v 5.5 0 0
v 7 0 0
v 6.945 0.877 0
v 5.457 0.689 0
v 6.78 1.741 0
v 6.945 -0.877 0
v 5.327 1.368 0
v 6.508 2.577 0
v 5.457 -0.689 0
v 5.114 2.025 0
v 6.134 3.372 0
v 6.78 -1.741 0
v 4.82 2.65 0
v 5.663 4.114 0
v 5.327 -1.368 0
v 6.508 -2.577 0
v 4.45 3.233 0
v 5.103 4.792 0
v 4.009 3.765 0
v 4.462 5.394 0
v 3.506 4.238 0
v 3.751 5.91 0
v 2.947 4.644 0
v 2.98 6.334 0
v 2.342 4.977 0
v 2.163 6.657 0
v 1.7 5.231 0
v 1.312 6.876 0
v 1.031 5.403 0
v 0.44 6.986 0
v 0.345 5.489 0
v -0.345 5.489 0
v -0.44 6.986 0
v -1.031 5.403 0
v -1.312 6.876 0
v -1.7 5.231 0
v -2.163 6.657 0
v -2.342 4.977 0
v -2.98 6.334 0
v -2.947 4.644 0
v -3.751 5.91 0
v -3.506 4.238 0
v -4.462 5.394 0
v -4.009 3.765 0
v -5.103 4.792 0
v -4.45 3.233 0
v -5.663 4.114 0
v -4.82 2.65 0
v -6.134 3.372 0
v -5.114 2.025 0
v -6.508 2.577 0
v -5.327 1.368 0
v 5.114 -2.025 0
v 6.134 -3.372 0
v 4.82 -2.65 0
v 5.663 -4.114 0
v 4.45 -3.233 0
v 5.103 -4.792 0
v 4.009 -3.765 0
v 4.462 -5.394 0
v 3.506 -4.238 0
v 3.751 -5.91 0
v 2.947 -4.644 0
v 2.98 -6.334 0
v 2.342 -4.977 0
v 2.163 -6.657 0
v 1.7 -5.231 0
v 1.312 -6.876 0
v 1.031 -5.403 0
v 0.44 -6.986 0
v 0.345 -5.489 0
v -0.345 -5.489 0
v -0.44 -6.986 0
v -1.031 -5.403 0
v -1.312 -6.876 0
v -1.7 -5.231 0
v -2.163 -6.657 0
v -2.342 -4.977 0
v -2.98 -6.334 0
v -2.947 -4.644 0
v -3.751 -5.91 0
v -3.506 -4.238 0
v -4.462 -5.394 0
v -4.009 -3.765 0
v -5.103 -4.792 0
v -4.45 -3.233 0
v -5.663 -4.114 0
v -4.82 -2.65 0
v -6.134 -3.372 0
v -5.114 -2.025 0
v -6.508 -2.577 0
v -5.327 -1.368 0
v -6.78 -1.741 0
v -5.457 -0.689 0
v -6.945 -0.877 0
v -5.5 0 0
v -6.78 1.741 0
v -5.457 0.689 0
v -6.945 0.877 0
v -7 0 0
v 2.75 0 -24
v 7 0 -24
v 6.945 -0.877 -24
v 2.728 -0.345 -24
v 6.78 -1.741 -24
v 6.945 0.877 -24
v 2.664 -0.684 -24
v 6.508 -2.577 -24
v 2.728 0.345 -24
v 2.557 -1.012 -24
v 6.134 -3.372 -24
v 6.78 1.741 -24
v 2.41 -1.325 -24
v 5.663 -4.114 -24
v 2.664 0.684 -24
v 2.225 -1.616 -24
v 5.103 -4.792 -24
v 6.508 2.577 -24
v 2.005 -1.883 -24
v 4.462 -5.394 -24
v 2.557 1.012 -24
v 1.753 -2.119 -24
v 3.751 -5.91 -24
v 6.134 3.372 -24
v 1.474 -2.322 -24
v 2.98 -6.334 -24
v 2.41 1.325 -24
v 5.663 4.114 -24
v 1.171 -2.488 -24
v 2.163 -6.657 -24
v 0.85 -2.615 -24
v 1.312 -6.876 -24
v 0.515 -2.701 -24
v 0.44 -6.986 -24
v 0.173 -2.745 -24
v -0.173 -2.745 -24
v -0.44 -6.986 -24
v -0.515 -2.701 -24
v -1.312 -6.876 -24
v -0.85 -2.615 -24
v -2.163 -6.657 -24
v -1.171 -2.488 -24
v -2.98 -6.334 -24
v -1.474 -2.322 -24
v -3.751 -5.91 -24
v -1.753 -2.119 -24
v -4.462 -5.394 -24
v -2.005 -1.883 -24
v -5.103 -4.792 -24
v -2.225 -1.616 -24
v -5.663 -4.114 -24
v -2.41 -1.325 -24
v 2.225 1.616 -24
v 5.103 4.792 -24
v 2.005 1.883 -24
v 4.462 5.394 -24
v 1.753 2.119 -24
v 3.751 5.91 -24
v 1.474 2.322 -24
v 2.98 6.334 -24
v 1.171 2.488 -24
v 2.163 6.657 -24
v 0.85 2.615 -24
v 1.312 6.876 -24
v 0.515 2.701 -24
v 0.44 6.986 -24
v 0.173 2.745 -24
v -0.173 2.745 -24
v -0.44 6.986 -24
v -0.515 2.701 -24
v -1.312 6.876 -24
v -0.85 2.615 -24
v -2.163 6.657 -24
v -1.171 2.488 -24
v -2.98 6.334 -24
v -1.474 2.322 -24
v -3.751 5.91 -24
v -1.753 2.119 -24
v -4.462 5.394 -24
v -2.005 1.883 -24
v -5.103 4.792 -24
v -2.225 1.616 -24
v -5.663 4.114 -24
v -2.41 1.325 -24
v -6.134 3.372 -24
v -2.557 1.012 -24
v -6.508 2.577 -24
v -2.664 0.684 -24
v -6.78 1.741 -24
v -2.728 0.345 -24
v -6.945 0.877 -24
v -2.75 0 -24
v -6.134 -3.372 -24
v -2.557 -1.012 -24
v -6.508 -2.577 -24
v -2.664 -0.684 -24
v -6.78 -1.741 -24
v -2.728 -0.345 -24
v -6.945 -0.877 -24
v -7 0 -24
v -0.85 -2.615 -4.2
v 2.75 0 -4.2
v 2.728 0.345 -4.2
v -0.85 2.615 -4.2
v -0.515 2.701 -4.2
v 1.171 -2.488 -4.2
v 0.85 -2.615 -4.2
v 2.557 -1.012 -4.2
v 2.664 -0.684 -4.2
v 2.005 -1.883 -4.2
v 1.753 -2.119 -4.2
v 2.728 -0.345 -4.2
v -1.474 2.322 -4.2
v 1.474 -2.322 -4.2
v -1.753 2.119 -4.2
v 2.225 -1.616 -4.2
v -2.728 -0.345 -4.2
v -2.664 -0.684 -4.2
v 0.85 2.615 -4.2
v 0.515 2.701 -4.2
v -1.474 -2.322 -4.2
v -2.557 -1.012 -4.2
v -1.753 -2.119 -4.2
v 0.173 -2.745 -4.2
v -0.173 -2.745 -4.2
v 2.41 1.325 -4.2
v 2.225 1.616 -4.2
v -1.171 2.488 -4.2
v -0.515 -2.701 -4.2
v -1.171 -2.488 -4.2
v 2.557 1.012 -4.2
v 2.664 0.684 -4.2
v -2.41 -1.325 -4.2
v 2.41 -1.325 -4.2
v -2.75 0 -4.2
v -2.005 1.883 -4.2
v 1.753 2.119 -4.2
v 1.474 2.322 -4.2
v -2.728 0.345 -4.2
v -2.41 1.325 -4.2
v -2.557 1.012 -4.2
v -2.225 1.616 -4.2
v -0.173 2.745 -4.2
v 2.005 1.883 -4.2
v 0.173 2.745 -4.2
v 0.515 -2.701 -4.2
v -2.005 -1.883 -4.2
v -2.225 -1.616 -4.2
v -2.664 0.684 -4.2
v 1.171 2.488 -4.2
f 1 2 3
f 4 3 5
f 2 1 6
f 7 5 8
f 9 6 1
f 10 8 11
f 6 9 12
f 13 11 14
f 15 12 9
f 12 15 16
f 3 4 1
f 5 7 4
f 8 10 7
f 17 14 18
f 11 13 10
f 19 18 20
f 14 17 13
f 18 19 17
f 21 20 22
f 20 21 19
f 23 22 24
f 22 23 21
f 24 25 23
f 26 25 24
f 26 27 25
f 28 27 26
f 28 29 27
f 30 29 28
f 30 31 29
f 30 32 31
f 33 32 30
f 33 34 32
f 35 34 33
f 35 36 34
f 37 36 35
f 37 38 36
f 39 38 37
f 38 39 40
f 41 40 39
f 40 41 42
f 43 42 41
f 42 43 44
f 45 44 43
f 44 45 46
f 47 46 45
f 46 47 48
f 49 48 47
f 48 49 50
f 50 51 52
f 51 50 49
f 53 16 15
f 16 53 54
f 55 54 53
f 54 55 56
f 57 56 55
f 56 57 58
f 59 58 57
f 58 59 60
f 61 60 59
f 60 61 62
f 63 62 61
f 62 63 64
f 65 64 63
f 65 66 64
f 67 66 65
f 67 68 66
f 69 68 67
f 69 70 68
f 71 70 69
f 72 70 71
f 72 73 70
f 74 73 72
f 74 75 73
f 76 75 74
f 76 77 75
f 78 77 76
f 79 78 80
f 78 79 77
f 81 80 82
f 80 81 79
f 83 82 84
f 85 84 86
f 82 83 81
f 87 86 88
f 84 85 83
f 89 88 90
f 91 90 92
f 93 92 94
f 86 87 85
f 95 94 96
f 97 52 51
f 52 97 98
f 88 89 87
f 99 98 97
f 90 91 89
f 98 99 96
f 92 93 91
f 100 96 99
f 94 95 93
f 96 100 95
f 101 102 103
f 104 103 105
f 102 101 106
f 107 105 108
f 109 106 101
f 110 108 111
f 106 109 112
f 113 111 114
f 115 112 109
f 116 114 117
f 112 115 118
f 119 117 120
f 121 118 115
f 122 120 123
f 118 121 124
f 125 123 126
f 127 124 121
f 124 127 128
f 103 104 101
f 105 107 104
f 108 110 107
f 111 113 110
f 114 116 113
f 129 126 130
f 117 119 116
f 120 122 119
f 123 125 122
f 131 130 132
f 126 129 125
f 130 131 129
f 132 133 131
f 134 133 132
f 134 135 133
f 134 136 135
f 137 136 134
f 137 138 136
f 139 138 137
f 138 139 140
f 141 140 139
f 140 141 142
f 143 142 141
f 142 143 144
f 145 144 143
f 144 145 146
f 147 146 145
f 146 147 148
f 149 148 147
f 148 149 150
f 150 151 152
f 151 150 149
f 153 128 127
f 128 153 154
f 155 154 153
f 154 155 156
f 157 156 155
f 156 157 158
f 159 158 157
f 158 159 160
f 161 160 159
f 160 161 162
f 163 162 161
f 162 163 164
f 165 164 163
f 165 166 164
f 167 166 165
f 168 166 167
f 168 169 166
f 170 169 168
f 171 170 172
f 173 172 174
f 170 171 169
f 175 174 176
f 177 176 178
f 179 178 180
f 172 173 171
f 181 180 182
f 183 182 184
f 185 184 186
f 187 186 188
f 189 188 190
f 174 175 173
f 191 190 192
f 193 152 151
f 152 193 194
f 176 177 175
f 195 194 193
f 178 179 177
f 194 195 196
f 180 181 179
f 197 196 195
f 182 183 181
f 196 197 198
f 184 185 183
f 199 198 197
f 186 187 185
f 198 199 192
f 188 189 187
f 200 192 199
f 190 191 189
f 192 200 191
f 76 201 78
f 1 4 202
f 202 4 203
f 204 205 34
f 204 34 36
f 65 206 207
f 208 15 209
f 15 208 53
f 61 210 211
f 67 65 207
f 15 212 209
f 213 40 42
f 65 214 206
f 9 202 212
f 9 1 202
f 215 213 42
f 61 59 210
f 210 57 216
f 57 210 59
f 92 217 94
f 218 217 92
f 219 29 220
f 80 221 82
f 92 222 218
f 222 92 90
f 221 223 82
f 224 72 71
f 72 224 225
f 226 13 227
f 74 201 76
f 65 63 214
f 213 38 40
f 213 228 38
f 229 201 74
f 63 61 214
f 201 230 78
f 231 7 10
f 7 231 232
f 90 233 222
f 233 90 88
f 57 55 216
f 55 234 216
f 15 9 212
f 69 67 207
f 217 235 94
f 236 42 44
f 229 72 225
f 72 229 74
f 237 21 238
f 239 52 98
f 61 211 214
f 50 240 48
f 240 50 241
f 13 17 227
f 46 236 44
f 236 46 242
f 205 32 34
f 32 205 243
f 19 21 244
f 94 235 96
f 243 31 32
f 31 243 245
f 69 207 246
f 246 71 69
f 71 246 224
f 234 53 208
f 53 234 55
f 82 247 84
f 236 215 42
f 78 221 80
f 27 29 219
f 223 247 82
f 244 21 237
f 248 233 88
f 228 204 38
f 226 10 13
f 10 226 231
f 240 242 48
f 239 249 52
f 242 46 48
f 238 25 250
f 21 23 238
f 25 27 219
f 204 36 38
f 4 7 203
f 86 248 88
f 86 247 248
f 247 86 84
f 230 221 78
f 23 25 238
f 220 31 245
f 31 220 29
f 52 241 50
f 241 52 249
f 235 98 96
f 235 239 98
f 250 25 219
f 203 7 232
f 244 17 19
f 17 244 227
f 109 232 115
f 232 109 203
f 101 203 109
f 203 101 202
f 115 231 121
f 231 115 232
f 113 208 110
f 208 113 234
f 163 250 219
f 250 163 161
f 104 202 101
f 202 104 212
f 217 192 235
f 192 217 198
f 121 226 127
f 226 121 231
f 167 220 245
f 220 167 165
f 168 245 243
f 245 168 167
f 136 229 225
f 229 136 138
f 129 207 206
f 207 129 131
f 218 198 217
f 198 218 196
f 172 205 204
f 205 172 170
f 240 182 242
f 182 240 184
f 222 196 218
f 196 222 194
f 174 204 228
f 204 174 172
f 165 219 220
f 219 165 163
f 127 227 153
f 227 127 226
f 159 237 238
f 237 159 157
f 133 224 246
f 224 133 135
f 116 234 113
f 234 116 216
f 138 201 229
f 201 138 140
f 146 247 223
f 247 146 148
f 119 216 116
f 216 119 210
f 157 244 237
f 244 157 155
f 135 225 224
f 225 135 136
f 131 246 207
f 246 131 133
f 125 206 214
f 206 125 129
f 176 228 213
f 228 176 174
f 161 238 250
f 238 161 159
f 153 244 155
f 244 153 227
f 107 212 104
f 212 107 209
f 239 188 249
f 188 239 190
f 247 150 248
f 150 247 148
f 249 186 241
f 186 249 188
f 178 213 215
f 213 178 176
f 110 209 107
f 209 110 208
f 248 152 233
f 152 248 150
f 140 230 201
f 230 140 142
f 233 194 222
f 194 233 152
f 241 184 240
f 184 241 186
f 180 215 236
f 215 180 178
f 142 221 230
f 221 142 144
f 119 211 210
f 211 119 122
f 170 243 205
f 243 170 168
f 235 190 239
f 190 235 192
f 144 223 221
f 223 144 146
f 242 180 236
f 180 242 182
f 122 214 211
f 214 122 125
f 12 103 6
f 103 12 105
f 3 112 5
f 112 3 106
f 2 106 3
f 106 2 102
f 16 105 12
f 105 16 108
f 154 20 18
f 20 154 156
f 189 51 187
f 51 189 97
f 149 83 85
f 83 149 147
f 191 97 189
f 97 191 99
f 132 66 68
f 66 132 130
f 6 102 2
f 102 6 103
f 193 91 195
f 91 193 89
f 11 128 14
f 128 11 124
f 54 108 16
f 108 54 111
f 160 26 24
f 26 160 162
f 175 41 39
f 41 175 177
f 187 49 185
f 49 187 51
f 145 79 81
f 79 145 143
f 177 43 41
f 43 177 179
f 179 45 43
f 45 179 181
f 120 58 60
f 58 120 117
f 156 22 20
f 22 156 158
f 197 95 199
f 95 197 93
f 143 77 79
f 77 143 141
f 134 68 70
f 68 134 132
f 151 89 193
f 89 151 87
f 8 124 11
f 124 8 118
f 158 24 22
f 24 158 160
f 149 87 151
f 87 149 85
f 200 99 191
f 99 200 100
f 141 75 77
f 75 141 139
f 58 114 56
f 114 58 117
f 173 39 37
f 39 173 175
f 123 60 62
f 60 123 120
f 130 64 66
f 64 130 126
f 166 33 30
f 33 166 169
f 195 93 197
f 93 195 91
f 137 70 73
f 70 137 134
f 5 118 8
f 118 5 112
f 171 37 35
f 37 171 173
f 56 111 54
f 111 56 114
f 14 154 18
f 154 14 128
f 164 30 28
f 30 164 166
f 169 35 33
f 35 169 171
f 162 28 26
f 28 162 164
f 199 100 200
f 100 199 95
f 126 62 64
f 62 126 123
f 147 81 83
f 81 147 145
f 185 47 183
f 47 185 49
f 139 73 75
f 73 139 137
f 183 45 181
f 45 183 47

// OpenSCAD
$fn = 50;


difference() {
	union() {
		translate(v = [0, 0, -24.0000000000]) {
			cylinder(h = 24, r = 7.0000000000);
		}
	}
	union() {
		translate(v = [0, 0, 0]) {
			rotate(a = [0, 0, 0]) {
				difference() {
					union() {
						#translate(v = [0, 0, -24.0000000000]) {
							cylinder(h = 24, r = 2.2500000000);
						}
						#translate(v = [0, 0, -4.2000000000]) {
							cylinder(h = 4.2000000000, r = 7.0000000000, r1 = 2.7500000000, r2 = 5.5000000000);
						}
						#translate(v = [0, 0, -24.0000000000]) {
							cylinder(h = 24, r = 2.7500000000);
						}
						#translate(v = [0, 0, -24.0000000000]) {
							cylinder(h = 24, r = 2.2500000000);
						}
					}
					union();
				}
			}
		}
	}
}
